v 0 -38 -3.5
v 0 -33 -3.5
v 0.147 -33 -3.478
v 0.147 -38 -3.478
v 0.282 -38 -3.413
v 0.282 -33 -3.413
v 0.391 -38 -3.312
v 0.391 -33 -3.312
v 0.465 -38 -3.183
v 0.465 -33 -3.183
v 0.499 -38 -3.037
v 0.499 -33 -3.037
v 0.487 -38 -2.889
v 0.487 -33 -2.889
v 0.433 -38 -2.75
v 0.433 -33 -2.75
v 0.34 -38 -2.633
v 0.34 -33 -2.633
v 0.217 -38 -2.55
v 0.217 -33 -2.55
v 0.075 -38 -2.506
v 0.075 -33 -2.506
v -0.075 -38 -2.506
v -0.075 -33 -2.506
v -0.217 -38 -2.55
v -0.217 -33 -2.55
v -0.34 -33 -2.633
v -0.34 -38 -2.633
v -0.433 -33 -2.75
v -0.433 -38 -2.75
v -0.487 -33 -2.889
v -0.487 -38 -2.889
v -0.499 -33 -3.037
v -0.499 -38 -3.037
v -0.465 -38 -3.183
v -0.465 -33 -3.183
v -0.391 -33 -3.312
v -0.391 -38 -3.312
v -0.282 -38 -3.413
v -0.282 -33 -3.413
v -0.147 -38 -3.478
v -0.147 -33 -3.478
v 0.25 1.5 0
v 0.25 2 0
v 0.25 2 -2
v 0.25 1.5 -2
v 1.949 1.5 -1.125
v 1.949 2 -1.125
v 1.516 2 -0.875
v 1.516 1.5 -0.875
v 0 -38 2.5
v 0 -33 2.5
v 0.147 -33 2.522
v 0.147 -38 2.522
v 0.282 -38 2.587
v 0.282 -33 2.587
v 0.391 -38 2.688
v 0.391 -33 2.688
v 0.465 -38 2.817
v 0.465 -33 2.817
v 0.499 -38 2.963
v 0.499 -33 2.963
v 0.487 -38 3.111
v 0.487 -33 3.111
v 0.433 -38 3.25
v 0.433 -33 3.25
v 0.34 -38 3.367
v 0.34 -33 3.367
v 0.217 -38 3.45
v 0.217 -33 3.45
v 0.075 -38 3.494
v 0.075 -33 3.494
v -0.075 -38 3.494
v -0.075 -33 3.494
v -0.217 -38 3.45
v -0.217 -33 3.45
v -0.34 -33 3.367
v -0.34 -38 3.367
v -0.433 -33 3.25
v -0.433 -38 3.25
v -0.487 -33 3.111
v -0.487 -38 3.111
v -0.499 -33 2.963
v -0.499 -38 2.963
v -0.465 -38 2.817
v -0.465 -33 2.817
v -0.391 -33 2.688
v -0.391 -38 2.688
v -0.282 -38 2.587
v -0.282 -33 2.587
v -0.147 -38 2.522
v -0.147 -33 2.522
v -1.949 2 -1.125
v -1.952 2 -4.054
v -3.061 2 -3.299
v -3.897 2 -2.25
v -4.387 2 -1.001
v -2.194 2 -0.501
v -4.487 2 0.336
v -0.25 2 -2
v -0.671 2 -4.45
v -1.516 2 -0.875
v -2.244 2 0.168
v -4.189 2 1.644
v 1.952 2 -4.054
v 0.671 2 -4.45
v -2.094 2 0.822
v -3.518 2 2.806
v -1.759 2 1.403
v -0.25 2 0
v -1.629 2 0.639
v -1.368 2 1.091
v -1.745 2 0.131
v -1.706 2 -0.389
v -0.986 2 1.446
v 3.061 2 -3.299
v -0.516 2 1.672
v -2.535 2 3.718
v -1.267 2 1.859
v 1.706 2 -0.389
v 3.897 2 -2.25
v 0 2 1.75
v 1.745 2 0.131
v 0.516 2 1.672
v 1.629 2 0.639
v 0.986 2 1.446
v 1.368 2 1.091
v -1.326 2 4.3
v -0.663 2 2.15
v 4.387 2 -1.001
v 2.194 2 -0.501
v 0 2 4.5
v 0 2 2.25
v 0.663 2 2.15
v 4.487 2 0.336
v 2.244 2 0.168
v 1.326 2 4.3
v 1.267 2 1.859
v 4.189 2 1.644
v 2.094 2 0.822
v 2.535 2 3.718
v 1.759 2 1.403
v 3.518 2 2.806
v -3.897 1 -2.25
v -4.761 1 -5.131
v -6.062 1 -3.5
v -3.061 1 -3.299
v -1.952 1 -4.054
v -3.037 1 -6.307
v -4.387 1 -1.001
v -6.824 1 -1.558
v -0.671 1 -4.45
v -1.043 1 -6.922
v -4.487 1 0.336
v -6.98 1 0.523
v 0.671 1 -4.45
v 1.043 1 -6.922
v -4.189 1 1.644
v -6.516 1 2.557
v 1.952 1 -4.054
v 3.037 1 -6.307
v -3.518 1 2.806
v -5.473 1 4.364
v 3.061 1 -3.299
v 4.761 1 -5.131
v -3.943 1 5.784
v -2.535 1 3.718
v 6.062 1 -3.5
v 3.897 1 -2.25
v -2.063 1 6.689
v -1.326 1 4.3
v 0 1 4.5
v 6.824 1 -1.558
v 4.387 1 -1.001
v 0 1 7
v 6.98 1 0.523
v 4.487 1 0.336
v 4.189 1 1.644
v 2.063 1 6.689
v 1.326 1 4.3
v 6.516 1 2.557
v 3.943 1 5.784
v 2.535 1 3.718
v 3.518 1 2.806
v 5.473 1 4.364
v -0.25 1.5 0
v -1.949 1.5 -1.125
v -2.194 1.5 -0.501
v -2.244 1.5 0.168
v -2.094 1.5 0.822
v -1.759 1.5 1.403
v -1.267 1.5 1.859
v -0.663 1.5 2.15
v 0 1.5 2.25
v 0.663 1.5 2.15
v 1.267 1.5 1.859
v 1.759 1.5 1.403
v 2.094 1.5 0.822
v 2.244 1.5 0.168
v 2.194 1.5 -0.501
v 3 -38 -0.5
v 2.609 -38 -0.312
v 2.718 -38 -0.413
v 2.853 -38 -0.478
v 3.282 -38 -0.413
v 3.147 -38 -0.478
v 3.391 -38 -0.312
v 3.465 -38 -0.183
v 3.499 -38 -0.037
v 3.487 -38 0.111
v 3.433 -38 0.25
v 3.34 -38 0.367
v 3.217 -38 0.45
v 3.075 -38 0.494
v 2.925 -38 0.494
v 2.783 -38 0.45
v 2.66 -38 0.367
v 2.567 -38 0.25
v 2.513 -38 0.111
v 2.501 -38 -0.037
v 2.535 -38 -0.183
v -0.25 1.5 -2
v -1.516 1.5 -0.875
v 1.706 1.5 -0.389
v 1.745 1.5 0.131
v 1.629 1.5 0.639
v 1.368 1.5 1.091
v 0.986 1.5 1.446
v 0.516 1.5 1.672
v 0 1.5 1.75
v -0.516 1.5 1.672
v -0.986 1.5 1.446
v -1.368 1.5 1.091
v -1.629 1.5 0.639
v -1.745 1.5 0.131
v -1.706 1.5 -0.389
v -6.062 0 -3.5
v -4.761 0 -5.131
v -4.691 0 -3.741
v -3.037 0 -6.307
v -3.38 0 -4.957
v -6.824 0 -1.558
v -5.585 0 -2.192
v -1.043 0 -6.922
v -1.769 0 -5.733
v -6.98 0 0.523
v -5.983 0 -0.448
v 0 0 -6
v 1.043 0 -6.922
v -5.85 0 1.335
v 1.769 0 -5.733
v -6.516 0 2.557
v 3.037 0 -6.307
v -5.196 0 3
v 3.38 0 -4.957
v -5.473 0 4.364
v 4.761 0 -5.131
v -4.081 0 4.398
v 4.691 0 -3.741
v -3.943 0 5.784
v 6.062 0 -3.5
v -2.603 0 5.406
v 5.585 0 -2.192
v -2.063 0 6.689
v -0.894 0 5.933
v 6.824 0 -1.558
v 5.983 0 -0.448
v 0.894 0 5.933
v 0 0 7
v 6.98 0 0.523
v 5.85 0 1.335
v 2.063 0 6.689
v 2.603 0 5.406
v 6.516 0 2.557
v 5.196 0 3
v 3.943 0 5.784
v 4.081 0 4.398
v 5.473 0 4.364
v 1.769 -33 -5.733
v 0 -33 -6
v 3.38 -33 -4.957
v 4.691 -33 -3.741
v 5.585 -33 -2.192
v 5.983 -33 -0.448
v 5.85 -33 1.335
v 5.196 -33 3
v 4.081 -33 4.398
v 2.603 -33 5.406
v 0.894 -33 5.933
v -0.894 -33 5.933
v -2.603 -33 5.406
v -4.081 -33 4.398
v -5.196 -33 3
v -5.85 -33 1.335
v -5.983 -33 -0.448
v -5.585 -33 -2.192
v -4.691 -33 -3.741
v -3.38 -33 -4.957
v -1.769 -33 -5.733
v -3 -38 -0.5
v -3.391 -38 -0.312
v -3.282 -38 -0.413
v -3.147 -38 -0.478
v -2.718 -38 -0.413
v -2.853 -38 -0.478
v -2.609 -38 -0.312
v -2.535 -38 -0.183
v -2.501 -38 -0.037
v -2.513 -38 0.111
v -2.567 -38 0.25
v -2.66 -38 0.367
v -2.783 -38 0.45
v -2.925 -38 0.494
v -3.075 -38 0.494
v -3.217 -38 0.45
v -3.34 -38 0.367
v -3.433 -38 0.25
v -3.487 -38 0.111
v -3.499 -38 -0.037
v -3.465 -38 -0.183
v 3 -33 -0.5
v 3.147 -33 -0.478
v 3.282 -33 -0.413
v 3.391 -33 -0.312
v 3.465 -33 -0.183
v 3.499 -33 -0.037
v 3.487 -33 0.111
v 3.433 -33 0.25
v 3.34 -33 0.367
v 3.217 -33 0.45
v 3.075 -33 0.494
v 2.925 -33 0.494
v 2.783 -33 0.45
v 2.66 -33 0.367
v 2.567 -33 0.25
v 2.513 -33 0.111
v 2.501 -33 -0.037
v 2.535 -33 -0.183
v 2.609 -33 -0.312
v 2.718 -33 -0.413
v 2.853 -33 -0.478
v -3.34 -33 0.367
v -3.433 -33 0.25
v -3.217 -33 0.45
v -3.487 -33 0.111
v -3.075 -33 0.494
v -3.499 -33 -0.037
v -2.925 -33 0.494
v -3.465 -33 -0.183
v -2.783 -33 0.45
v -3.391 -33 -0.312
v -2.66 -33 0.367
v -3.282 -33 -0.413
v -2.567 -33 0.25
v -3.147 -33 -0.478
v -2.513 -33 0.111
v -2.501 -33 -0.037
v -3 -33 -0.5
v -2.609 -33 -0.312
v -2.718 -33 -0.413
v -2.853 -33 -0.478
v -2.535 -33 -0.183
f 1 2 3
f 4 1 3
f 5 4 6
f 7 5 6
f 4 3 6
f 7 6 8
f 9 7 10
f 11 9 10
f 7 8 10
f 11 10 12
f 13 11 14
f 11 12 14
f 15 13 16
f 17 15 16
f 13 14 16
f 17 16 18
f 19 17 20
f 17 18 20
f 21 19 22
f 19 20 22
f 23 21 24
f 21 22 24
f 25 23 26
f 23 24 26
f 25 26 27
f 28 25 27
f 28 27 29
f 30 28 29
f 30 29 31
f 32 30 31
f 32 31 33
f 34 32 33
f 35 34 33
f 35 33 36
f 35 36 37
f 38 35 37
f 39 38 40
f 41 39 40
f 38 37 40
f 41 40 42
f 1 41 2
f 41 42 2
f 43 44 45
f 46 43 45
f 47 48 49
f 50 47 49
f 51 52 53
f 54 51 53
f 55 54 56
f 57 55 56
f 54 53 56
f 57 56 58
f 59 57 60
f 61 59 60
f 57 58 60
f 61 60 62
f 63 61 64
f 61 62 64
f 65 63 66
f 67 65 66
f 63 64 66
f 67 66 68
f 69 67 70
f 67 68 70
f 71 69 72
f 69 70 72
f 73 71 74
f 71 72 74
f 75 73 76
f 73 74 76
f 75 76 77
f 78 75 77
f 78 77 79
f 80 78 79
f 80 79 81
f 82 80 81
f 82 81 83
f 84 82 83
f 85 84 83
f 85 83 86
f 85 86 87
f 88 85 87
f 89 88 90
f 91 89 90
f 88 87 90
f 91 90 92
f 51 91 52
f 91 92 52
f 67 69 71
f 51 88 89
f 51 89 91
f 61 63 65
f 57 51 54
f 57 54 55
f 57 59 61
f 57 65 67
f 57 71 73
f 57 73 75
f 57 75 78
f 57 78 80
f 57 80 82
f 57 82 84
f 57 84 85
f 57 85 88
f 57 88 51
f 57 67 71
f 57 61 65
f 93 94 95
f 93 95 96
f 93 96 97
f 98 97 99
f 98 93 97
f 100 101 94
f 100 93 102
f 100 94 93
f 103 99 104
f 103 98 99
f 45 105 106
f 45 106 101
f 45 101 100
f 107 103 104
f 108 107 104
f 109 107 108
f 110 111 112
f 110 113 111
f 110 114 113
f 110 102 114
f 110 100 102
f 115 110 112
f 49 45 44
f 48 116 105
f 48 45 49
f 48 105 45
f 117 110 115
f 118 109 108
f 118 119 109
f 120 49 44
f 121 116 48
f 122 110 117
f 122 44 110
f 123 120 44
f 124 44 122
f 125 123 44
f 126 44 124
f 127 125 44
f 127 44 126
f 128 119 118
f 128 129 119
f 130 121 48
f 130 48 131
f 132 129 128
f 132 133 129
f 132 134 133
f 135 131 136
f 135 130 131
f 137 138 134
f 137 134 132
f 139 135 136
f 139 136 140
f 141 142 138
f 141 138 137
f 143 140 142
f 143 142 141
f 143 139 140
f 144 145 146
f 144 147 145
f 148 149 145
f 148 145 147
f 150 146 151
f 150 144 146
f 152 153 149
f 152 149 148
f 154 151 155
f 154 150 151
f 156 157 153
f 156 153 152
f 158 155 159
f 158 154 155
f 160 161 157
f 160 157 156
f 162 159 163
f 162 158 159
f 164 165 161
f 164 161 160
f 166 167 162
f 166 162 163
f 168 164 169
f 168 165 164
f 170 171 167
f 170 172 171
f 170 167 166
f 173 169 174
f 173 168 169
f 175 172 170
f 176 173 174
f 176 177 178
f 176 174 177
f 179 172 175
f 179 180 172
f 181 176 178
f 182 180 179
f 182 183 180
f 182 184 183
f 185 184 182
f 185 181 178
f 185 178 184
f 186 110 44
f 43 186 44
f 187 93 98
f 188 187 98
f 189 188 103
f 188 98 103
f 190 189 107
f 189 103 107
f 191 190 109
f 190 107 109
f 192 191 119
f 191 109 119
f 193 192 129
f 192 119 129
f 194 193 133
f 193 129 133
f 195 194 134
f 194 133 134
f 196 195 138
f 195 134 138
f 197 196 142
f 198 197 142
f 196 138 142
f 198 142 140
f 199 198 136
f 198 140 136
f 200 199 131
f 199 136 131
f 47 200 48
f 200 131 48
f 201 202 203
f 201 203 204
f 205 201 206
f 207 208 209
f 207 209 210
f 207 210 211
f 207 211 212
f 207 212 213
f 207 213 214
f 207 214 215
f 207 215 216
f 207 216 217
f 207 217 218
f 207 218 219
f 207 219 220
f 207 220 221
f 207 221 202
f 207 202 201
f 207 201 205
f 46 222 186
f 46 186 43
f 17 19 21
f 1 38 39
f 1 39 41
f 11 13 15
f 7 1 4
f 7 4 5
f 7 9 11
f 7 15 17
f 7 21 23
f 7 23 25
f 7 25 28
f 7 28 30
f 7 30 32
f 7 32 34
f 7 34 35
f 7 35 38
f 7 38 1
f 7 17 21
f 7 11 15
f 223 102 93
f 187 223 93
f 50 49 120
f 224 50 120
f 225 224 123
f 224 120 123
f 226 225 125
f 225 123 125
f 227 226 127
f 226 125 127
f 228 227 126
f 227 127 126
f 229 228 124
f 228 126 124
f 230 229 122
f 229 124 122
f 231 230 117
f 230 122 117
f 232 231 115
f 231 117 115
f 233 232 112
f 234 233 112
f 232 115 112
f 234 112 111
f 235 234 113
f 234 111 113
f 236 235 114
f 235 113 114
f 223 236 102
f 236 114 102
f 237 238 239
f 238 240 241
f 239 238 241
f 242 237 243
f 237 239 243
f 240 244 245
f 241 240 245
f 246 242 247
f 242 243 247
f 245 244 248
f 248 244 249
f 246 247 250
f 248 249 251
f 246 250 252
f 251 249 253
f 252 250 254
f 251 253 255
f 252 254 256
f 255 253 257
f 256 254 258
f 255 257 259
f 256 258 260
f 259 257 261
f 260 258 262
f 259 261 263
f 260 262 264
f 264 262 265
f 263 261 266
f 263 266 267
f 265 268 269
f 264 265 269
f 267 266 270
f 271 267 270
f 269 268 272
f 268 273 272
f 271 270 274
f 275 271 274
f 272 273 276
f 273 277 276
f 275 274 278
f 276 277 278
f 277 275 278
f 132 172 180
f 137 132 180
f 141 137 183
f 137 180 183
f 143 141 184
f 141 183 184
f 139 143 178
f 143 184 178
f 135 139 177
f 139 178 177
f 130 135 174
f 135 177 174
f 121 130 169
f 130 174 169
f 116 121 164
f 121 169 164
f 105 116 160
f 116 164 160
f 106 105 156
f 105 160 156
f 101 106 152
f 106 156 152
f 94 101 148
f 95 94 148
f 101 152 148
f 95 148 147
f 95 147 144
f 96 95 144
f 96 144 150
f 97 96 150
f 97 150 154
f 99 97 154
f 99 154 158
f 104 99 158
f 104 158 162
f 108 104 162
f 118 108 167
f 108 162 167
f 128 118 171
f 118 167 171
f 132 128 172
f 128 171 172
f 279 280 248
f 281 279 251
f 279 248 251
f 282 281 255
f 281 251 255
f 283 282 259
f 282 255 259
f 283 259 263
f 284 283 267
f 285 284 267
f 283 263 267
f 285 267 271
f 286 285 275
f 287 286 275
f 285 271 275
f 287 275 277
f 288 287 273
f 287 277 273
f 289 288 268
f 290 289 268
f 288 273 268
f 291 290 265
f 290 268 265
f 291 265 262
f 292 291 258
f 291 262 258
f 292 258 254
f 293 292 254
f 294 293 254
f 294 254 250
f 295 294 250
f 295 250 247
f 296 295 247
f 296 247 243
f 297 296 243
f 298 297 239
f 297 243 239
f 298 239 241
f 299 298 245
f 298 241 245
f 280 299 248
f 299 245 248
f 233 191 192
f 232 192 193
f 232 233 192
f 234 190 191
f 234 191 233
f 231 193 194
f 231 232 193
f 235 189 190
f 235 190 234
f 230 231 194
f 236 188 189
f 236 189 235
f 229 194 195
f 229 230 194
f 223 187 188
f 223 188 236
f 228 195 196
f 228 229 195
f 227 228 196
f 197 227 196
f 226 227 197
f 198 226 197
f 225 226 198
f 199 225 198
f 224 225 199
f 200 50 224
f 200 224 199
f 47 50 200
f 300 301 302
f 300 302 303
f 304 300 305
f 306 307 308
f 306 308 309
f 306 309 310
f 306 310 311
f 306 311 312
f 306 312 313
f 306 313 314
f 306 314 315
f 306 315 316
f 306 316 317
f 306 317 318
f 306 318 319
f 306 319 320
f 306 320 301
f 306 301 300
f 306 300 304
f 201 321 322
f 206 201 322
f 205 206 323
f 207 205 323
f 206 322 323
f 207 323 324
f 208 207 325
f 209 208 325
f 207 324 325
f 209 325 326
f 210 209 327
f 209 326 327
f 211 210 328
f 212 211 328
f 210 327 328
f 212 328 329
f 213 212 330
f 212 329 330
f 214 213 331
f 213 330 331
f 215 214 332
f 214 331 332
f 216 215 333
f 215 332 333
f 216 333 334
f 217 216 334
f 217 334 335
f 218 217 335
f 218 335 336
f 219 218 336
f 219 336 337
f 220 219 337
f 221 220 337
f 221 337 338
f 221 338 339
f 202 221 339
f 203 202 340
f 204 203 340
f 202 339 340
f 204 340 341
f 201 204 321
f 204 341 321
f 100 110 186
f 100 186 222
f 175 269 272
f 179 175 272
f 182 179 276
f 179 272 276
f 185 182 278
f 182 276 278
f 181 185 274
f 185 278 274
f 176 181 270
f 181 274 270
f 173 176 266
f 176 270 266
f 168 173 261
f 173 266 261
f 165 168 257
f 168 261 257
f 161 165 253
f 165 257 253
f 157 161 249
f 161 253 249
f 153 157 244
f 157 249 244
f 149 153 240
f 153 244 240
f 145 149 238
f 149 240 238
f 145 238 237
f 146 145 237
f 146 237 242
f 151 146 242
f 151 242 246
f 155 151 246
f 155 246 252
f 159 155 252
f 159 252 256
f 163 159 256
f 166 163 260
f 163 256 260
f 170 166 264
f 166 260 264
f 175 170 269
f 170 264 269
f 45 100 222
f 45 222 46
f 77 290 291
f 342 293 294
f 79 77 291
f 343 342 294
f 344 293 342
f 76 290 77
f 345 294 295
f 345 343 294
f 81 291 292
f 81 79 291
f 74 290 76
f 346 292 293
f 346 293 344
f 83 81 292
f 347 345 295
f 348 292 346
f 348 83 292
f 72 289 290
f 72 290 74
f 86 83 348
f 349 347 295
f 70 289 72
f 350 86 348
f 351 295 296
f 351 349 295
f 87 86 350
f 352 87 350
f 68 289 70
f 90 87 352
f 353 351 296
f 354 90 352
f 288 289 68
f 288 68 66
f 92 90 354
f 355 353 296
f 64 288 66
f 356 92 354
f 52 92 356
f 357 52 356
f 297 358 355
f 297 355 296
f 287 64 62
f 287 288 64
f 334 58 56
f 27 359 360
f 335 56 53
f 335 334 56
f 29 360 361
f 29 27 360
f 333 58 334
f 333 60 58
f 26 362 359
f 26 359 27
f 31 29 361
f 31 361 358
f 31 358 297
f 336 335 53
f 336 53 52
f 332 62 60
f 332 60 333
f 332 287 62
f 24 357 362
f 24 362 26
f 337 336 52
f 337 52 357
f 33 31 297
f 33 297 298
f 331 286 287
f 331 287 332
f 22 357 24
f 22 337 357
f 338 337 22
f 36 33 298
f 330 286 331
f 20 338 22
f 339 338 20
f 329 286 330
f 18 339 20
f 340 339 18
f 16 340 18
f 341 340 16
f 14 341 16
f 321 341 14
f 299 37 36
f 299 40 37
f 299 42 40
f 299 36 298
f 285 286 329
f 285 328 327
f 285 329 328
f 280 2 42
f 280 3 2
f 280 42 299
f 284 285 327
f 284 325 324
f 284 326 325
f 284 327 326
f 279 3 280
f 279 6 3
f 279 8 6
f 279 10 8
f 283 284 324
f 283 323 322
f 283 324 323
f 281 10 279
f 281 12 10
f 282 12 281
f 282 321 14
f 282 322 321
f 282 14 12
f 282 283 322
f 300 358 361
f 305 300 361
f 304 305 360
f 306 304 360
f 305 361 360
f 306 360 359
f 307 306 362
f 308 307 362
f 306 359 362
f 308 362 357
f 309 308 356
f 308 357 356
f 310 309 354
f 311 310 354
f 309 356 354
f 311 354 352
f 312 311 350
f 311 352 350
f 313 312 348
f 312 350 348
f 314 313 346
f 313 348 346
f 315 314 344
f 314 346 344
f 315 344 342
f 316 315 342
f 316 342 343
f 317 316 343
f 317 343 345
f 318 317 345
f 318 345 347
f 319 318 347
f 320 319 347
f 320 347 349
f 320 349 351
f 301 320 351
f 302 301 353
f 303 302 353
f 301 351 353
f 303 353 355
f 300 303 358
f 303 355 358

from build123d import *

# Parameters (mm, degrees)
SKETCH_1_R          = 7
EXTRUDE_1_DEPTH     = 1
SKETCH_2_R          = 4.5
EXTRUDE_2_DEPTH     = 1
SKETCH_3_W          = 0.5
SKETCH_3_H          = 2
CUT_EXTRUDE_1_DEPTH = 0.5
SKETCH_4_R          = 6
EXTRUDE_3_DEPTH     = 33
SKETCH_5_R          = 0.5
EXTRUDE_4_DEPTH     = 5


with BuildPart() as part:
    # 草图1 → 凸台-拉伸1 (new body)
    with BuildSketch(Plane(origin=(0, 0, 0), x_dir=(1, 0, 0), z_dir=(0, 1, 0))):
        with Locations(Location((0, 0, 0), (0, 0, 270))):
            Circle(SKETCH_1_R)
    extrude(amount=EXTRUDE_1_DEPTH)

    # 草图2 → 凸台-拉伸2 (add)
    with BuildSketch(Plane(origin=(0, 1, 0), x_dir=(1, 0, 0), z_dir=(0, 1, 0))):
        with Locations(Location((0, 0, 0), (0, 0, 270))):
            Circle(SKETCH_2_R)
    extrude(amount=EXTRUDE_2_DEPTH)

    # 草图3 → 切除-拉伸-薄壁1 (cut)
    with BuildSketch(Plane(origin=(0, 2, 0), x_dir=(1, 0, 0), z_dir=(0, 1, 0))):
        with Locations((0, 1)):
            Rectangle(SKETCH_3_W, SKETCH_3_H)
        with BuildLine():
            ThreePointArc((-1.948557159, 1.125), (0, -2.25), (1.948557159, 1.125))
            Line((1.948557159, 1.125), (1.515544457, 0.875))
            ThreePointArc((1.515544457, 0.875), (0, -1.75), (-1.515544457, 0.875))
            Line((-1.515544457, 0.875), (-1.948557159, 1.125))
        make_face()
    extrude(amount=-CUT_EXTRUDE_1_DEPTH, mode=Mode.SUBTRACT)

    # 草图4 → 凸台-拉伸3 (add)
    with BuildSketch(Plane.XZ):
        with Locations(Location((0, 0, 0), (0, 0, 270))):
            Circle(SKETCH_4_R)
    extrude(amount=EXTRUDE_3_DEPTH)

    # 草图5 → 凸台-拉伸4 (add)
    with BuildSketch(Plane.XZ.offset(33)):
        with Locations(Location((0, 3, 0), (0, 0, 270))):
            Circle(SKETCH_5_R)
        with Locations(Location((3, 0, 0), (0, 0, 270))):
            Circle(SKETCH_5_R)
        with Locations(Location((0, -3, 0), (0, 0, 270))):
            Circle(SKETCH_5_R)
        with Locations(Location((-3, 0, 0), (0, 0, 270))):
            Circle(SKETCH_5_R)
    extrude(amount=EXTRUDE_4_DEPTH)


solid = part.part
